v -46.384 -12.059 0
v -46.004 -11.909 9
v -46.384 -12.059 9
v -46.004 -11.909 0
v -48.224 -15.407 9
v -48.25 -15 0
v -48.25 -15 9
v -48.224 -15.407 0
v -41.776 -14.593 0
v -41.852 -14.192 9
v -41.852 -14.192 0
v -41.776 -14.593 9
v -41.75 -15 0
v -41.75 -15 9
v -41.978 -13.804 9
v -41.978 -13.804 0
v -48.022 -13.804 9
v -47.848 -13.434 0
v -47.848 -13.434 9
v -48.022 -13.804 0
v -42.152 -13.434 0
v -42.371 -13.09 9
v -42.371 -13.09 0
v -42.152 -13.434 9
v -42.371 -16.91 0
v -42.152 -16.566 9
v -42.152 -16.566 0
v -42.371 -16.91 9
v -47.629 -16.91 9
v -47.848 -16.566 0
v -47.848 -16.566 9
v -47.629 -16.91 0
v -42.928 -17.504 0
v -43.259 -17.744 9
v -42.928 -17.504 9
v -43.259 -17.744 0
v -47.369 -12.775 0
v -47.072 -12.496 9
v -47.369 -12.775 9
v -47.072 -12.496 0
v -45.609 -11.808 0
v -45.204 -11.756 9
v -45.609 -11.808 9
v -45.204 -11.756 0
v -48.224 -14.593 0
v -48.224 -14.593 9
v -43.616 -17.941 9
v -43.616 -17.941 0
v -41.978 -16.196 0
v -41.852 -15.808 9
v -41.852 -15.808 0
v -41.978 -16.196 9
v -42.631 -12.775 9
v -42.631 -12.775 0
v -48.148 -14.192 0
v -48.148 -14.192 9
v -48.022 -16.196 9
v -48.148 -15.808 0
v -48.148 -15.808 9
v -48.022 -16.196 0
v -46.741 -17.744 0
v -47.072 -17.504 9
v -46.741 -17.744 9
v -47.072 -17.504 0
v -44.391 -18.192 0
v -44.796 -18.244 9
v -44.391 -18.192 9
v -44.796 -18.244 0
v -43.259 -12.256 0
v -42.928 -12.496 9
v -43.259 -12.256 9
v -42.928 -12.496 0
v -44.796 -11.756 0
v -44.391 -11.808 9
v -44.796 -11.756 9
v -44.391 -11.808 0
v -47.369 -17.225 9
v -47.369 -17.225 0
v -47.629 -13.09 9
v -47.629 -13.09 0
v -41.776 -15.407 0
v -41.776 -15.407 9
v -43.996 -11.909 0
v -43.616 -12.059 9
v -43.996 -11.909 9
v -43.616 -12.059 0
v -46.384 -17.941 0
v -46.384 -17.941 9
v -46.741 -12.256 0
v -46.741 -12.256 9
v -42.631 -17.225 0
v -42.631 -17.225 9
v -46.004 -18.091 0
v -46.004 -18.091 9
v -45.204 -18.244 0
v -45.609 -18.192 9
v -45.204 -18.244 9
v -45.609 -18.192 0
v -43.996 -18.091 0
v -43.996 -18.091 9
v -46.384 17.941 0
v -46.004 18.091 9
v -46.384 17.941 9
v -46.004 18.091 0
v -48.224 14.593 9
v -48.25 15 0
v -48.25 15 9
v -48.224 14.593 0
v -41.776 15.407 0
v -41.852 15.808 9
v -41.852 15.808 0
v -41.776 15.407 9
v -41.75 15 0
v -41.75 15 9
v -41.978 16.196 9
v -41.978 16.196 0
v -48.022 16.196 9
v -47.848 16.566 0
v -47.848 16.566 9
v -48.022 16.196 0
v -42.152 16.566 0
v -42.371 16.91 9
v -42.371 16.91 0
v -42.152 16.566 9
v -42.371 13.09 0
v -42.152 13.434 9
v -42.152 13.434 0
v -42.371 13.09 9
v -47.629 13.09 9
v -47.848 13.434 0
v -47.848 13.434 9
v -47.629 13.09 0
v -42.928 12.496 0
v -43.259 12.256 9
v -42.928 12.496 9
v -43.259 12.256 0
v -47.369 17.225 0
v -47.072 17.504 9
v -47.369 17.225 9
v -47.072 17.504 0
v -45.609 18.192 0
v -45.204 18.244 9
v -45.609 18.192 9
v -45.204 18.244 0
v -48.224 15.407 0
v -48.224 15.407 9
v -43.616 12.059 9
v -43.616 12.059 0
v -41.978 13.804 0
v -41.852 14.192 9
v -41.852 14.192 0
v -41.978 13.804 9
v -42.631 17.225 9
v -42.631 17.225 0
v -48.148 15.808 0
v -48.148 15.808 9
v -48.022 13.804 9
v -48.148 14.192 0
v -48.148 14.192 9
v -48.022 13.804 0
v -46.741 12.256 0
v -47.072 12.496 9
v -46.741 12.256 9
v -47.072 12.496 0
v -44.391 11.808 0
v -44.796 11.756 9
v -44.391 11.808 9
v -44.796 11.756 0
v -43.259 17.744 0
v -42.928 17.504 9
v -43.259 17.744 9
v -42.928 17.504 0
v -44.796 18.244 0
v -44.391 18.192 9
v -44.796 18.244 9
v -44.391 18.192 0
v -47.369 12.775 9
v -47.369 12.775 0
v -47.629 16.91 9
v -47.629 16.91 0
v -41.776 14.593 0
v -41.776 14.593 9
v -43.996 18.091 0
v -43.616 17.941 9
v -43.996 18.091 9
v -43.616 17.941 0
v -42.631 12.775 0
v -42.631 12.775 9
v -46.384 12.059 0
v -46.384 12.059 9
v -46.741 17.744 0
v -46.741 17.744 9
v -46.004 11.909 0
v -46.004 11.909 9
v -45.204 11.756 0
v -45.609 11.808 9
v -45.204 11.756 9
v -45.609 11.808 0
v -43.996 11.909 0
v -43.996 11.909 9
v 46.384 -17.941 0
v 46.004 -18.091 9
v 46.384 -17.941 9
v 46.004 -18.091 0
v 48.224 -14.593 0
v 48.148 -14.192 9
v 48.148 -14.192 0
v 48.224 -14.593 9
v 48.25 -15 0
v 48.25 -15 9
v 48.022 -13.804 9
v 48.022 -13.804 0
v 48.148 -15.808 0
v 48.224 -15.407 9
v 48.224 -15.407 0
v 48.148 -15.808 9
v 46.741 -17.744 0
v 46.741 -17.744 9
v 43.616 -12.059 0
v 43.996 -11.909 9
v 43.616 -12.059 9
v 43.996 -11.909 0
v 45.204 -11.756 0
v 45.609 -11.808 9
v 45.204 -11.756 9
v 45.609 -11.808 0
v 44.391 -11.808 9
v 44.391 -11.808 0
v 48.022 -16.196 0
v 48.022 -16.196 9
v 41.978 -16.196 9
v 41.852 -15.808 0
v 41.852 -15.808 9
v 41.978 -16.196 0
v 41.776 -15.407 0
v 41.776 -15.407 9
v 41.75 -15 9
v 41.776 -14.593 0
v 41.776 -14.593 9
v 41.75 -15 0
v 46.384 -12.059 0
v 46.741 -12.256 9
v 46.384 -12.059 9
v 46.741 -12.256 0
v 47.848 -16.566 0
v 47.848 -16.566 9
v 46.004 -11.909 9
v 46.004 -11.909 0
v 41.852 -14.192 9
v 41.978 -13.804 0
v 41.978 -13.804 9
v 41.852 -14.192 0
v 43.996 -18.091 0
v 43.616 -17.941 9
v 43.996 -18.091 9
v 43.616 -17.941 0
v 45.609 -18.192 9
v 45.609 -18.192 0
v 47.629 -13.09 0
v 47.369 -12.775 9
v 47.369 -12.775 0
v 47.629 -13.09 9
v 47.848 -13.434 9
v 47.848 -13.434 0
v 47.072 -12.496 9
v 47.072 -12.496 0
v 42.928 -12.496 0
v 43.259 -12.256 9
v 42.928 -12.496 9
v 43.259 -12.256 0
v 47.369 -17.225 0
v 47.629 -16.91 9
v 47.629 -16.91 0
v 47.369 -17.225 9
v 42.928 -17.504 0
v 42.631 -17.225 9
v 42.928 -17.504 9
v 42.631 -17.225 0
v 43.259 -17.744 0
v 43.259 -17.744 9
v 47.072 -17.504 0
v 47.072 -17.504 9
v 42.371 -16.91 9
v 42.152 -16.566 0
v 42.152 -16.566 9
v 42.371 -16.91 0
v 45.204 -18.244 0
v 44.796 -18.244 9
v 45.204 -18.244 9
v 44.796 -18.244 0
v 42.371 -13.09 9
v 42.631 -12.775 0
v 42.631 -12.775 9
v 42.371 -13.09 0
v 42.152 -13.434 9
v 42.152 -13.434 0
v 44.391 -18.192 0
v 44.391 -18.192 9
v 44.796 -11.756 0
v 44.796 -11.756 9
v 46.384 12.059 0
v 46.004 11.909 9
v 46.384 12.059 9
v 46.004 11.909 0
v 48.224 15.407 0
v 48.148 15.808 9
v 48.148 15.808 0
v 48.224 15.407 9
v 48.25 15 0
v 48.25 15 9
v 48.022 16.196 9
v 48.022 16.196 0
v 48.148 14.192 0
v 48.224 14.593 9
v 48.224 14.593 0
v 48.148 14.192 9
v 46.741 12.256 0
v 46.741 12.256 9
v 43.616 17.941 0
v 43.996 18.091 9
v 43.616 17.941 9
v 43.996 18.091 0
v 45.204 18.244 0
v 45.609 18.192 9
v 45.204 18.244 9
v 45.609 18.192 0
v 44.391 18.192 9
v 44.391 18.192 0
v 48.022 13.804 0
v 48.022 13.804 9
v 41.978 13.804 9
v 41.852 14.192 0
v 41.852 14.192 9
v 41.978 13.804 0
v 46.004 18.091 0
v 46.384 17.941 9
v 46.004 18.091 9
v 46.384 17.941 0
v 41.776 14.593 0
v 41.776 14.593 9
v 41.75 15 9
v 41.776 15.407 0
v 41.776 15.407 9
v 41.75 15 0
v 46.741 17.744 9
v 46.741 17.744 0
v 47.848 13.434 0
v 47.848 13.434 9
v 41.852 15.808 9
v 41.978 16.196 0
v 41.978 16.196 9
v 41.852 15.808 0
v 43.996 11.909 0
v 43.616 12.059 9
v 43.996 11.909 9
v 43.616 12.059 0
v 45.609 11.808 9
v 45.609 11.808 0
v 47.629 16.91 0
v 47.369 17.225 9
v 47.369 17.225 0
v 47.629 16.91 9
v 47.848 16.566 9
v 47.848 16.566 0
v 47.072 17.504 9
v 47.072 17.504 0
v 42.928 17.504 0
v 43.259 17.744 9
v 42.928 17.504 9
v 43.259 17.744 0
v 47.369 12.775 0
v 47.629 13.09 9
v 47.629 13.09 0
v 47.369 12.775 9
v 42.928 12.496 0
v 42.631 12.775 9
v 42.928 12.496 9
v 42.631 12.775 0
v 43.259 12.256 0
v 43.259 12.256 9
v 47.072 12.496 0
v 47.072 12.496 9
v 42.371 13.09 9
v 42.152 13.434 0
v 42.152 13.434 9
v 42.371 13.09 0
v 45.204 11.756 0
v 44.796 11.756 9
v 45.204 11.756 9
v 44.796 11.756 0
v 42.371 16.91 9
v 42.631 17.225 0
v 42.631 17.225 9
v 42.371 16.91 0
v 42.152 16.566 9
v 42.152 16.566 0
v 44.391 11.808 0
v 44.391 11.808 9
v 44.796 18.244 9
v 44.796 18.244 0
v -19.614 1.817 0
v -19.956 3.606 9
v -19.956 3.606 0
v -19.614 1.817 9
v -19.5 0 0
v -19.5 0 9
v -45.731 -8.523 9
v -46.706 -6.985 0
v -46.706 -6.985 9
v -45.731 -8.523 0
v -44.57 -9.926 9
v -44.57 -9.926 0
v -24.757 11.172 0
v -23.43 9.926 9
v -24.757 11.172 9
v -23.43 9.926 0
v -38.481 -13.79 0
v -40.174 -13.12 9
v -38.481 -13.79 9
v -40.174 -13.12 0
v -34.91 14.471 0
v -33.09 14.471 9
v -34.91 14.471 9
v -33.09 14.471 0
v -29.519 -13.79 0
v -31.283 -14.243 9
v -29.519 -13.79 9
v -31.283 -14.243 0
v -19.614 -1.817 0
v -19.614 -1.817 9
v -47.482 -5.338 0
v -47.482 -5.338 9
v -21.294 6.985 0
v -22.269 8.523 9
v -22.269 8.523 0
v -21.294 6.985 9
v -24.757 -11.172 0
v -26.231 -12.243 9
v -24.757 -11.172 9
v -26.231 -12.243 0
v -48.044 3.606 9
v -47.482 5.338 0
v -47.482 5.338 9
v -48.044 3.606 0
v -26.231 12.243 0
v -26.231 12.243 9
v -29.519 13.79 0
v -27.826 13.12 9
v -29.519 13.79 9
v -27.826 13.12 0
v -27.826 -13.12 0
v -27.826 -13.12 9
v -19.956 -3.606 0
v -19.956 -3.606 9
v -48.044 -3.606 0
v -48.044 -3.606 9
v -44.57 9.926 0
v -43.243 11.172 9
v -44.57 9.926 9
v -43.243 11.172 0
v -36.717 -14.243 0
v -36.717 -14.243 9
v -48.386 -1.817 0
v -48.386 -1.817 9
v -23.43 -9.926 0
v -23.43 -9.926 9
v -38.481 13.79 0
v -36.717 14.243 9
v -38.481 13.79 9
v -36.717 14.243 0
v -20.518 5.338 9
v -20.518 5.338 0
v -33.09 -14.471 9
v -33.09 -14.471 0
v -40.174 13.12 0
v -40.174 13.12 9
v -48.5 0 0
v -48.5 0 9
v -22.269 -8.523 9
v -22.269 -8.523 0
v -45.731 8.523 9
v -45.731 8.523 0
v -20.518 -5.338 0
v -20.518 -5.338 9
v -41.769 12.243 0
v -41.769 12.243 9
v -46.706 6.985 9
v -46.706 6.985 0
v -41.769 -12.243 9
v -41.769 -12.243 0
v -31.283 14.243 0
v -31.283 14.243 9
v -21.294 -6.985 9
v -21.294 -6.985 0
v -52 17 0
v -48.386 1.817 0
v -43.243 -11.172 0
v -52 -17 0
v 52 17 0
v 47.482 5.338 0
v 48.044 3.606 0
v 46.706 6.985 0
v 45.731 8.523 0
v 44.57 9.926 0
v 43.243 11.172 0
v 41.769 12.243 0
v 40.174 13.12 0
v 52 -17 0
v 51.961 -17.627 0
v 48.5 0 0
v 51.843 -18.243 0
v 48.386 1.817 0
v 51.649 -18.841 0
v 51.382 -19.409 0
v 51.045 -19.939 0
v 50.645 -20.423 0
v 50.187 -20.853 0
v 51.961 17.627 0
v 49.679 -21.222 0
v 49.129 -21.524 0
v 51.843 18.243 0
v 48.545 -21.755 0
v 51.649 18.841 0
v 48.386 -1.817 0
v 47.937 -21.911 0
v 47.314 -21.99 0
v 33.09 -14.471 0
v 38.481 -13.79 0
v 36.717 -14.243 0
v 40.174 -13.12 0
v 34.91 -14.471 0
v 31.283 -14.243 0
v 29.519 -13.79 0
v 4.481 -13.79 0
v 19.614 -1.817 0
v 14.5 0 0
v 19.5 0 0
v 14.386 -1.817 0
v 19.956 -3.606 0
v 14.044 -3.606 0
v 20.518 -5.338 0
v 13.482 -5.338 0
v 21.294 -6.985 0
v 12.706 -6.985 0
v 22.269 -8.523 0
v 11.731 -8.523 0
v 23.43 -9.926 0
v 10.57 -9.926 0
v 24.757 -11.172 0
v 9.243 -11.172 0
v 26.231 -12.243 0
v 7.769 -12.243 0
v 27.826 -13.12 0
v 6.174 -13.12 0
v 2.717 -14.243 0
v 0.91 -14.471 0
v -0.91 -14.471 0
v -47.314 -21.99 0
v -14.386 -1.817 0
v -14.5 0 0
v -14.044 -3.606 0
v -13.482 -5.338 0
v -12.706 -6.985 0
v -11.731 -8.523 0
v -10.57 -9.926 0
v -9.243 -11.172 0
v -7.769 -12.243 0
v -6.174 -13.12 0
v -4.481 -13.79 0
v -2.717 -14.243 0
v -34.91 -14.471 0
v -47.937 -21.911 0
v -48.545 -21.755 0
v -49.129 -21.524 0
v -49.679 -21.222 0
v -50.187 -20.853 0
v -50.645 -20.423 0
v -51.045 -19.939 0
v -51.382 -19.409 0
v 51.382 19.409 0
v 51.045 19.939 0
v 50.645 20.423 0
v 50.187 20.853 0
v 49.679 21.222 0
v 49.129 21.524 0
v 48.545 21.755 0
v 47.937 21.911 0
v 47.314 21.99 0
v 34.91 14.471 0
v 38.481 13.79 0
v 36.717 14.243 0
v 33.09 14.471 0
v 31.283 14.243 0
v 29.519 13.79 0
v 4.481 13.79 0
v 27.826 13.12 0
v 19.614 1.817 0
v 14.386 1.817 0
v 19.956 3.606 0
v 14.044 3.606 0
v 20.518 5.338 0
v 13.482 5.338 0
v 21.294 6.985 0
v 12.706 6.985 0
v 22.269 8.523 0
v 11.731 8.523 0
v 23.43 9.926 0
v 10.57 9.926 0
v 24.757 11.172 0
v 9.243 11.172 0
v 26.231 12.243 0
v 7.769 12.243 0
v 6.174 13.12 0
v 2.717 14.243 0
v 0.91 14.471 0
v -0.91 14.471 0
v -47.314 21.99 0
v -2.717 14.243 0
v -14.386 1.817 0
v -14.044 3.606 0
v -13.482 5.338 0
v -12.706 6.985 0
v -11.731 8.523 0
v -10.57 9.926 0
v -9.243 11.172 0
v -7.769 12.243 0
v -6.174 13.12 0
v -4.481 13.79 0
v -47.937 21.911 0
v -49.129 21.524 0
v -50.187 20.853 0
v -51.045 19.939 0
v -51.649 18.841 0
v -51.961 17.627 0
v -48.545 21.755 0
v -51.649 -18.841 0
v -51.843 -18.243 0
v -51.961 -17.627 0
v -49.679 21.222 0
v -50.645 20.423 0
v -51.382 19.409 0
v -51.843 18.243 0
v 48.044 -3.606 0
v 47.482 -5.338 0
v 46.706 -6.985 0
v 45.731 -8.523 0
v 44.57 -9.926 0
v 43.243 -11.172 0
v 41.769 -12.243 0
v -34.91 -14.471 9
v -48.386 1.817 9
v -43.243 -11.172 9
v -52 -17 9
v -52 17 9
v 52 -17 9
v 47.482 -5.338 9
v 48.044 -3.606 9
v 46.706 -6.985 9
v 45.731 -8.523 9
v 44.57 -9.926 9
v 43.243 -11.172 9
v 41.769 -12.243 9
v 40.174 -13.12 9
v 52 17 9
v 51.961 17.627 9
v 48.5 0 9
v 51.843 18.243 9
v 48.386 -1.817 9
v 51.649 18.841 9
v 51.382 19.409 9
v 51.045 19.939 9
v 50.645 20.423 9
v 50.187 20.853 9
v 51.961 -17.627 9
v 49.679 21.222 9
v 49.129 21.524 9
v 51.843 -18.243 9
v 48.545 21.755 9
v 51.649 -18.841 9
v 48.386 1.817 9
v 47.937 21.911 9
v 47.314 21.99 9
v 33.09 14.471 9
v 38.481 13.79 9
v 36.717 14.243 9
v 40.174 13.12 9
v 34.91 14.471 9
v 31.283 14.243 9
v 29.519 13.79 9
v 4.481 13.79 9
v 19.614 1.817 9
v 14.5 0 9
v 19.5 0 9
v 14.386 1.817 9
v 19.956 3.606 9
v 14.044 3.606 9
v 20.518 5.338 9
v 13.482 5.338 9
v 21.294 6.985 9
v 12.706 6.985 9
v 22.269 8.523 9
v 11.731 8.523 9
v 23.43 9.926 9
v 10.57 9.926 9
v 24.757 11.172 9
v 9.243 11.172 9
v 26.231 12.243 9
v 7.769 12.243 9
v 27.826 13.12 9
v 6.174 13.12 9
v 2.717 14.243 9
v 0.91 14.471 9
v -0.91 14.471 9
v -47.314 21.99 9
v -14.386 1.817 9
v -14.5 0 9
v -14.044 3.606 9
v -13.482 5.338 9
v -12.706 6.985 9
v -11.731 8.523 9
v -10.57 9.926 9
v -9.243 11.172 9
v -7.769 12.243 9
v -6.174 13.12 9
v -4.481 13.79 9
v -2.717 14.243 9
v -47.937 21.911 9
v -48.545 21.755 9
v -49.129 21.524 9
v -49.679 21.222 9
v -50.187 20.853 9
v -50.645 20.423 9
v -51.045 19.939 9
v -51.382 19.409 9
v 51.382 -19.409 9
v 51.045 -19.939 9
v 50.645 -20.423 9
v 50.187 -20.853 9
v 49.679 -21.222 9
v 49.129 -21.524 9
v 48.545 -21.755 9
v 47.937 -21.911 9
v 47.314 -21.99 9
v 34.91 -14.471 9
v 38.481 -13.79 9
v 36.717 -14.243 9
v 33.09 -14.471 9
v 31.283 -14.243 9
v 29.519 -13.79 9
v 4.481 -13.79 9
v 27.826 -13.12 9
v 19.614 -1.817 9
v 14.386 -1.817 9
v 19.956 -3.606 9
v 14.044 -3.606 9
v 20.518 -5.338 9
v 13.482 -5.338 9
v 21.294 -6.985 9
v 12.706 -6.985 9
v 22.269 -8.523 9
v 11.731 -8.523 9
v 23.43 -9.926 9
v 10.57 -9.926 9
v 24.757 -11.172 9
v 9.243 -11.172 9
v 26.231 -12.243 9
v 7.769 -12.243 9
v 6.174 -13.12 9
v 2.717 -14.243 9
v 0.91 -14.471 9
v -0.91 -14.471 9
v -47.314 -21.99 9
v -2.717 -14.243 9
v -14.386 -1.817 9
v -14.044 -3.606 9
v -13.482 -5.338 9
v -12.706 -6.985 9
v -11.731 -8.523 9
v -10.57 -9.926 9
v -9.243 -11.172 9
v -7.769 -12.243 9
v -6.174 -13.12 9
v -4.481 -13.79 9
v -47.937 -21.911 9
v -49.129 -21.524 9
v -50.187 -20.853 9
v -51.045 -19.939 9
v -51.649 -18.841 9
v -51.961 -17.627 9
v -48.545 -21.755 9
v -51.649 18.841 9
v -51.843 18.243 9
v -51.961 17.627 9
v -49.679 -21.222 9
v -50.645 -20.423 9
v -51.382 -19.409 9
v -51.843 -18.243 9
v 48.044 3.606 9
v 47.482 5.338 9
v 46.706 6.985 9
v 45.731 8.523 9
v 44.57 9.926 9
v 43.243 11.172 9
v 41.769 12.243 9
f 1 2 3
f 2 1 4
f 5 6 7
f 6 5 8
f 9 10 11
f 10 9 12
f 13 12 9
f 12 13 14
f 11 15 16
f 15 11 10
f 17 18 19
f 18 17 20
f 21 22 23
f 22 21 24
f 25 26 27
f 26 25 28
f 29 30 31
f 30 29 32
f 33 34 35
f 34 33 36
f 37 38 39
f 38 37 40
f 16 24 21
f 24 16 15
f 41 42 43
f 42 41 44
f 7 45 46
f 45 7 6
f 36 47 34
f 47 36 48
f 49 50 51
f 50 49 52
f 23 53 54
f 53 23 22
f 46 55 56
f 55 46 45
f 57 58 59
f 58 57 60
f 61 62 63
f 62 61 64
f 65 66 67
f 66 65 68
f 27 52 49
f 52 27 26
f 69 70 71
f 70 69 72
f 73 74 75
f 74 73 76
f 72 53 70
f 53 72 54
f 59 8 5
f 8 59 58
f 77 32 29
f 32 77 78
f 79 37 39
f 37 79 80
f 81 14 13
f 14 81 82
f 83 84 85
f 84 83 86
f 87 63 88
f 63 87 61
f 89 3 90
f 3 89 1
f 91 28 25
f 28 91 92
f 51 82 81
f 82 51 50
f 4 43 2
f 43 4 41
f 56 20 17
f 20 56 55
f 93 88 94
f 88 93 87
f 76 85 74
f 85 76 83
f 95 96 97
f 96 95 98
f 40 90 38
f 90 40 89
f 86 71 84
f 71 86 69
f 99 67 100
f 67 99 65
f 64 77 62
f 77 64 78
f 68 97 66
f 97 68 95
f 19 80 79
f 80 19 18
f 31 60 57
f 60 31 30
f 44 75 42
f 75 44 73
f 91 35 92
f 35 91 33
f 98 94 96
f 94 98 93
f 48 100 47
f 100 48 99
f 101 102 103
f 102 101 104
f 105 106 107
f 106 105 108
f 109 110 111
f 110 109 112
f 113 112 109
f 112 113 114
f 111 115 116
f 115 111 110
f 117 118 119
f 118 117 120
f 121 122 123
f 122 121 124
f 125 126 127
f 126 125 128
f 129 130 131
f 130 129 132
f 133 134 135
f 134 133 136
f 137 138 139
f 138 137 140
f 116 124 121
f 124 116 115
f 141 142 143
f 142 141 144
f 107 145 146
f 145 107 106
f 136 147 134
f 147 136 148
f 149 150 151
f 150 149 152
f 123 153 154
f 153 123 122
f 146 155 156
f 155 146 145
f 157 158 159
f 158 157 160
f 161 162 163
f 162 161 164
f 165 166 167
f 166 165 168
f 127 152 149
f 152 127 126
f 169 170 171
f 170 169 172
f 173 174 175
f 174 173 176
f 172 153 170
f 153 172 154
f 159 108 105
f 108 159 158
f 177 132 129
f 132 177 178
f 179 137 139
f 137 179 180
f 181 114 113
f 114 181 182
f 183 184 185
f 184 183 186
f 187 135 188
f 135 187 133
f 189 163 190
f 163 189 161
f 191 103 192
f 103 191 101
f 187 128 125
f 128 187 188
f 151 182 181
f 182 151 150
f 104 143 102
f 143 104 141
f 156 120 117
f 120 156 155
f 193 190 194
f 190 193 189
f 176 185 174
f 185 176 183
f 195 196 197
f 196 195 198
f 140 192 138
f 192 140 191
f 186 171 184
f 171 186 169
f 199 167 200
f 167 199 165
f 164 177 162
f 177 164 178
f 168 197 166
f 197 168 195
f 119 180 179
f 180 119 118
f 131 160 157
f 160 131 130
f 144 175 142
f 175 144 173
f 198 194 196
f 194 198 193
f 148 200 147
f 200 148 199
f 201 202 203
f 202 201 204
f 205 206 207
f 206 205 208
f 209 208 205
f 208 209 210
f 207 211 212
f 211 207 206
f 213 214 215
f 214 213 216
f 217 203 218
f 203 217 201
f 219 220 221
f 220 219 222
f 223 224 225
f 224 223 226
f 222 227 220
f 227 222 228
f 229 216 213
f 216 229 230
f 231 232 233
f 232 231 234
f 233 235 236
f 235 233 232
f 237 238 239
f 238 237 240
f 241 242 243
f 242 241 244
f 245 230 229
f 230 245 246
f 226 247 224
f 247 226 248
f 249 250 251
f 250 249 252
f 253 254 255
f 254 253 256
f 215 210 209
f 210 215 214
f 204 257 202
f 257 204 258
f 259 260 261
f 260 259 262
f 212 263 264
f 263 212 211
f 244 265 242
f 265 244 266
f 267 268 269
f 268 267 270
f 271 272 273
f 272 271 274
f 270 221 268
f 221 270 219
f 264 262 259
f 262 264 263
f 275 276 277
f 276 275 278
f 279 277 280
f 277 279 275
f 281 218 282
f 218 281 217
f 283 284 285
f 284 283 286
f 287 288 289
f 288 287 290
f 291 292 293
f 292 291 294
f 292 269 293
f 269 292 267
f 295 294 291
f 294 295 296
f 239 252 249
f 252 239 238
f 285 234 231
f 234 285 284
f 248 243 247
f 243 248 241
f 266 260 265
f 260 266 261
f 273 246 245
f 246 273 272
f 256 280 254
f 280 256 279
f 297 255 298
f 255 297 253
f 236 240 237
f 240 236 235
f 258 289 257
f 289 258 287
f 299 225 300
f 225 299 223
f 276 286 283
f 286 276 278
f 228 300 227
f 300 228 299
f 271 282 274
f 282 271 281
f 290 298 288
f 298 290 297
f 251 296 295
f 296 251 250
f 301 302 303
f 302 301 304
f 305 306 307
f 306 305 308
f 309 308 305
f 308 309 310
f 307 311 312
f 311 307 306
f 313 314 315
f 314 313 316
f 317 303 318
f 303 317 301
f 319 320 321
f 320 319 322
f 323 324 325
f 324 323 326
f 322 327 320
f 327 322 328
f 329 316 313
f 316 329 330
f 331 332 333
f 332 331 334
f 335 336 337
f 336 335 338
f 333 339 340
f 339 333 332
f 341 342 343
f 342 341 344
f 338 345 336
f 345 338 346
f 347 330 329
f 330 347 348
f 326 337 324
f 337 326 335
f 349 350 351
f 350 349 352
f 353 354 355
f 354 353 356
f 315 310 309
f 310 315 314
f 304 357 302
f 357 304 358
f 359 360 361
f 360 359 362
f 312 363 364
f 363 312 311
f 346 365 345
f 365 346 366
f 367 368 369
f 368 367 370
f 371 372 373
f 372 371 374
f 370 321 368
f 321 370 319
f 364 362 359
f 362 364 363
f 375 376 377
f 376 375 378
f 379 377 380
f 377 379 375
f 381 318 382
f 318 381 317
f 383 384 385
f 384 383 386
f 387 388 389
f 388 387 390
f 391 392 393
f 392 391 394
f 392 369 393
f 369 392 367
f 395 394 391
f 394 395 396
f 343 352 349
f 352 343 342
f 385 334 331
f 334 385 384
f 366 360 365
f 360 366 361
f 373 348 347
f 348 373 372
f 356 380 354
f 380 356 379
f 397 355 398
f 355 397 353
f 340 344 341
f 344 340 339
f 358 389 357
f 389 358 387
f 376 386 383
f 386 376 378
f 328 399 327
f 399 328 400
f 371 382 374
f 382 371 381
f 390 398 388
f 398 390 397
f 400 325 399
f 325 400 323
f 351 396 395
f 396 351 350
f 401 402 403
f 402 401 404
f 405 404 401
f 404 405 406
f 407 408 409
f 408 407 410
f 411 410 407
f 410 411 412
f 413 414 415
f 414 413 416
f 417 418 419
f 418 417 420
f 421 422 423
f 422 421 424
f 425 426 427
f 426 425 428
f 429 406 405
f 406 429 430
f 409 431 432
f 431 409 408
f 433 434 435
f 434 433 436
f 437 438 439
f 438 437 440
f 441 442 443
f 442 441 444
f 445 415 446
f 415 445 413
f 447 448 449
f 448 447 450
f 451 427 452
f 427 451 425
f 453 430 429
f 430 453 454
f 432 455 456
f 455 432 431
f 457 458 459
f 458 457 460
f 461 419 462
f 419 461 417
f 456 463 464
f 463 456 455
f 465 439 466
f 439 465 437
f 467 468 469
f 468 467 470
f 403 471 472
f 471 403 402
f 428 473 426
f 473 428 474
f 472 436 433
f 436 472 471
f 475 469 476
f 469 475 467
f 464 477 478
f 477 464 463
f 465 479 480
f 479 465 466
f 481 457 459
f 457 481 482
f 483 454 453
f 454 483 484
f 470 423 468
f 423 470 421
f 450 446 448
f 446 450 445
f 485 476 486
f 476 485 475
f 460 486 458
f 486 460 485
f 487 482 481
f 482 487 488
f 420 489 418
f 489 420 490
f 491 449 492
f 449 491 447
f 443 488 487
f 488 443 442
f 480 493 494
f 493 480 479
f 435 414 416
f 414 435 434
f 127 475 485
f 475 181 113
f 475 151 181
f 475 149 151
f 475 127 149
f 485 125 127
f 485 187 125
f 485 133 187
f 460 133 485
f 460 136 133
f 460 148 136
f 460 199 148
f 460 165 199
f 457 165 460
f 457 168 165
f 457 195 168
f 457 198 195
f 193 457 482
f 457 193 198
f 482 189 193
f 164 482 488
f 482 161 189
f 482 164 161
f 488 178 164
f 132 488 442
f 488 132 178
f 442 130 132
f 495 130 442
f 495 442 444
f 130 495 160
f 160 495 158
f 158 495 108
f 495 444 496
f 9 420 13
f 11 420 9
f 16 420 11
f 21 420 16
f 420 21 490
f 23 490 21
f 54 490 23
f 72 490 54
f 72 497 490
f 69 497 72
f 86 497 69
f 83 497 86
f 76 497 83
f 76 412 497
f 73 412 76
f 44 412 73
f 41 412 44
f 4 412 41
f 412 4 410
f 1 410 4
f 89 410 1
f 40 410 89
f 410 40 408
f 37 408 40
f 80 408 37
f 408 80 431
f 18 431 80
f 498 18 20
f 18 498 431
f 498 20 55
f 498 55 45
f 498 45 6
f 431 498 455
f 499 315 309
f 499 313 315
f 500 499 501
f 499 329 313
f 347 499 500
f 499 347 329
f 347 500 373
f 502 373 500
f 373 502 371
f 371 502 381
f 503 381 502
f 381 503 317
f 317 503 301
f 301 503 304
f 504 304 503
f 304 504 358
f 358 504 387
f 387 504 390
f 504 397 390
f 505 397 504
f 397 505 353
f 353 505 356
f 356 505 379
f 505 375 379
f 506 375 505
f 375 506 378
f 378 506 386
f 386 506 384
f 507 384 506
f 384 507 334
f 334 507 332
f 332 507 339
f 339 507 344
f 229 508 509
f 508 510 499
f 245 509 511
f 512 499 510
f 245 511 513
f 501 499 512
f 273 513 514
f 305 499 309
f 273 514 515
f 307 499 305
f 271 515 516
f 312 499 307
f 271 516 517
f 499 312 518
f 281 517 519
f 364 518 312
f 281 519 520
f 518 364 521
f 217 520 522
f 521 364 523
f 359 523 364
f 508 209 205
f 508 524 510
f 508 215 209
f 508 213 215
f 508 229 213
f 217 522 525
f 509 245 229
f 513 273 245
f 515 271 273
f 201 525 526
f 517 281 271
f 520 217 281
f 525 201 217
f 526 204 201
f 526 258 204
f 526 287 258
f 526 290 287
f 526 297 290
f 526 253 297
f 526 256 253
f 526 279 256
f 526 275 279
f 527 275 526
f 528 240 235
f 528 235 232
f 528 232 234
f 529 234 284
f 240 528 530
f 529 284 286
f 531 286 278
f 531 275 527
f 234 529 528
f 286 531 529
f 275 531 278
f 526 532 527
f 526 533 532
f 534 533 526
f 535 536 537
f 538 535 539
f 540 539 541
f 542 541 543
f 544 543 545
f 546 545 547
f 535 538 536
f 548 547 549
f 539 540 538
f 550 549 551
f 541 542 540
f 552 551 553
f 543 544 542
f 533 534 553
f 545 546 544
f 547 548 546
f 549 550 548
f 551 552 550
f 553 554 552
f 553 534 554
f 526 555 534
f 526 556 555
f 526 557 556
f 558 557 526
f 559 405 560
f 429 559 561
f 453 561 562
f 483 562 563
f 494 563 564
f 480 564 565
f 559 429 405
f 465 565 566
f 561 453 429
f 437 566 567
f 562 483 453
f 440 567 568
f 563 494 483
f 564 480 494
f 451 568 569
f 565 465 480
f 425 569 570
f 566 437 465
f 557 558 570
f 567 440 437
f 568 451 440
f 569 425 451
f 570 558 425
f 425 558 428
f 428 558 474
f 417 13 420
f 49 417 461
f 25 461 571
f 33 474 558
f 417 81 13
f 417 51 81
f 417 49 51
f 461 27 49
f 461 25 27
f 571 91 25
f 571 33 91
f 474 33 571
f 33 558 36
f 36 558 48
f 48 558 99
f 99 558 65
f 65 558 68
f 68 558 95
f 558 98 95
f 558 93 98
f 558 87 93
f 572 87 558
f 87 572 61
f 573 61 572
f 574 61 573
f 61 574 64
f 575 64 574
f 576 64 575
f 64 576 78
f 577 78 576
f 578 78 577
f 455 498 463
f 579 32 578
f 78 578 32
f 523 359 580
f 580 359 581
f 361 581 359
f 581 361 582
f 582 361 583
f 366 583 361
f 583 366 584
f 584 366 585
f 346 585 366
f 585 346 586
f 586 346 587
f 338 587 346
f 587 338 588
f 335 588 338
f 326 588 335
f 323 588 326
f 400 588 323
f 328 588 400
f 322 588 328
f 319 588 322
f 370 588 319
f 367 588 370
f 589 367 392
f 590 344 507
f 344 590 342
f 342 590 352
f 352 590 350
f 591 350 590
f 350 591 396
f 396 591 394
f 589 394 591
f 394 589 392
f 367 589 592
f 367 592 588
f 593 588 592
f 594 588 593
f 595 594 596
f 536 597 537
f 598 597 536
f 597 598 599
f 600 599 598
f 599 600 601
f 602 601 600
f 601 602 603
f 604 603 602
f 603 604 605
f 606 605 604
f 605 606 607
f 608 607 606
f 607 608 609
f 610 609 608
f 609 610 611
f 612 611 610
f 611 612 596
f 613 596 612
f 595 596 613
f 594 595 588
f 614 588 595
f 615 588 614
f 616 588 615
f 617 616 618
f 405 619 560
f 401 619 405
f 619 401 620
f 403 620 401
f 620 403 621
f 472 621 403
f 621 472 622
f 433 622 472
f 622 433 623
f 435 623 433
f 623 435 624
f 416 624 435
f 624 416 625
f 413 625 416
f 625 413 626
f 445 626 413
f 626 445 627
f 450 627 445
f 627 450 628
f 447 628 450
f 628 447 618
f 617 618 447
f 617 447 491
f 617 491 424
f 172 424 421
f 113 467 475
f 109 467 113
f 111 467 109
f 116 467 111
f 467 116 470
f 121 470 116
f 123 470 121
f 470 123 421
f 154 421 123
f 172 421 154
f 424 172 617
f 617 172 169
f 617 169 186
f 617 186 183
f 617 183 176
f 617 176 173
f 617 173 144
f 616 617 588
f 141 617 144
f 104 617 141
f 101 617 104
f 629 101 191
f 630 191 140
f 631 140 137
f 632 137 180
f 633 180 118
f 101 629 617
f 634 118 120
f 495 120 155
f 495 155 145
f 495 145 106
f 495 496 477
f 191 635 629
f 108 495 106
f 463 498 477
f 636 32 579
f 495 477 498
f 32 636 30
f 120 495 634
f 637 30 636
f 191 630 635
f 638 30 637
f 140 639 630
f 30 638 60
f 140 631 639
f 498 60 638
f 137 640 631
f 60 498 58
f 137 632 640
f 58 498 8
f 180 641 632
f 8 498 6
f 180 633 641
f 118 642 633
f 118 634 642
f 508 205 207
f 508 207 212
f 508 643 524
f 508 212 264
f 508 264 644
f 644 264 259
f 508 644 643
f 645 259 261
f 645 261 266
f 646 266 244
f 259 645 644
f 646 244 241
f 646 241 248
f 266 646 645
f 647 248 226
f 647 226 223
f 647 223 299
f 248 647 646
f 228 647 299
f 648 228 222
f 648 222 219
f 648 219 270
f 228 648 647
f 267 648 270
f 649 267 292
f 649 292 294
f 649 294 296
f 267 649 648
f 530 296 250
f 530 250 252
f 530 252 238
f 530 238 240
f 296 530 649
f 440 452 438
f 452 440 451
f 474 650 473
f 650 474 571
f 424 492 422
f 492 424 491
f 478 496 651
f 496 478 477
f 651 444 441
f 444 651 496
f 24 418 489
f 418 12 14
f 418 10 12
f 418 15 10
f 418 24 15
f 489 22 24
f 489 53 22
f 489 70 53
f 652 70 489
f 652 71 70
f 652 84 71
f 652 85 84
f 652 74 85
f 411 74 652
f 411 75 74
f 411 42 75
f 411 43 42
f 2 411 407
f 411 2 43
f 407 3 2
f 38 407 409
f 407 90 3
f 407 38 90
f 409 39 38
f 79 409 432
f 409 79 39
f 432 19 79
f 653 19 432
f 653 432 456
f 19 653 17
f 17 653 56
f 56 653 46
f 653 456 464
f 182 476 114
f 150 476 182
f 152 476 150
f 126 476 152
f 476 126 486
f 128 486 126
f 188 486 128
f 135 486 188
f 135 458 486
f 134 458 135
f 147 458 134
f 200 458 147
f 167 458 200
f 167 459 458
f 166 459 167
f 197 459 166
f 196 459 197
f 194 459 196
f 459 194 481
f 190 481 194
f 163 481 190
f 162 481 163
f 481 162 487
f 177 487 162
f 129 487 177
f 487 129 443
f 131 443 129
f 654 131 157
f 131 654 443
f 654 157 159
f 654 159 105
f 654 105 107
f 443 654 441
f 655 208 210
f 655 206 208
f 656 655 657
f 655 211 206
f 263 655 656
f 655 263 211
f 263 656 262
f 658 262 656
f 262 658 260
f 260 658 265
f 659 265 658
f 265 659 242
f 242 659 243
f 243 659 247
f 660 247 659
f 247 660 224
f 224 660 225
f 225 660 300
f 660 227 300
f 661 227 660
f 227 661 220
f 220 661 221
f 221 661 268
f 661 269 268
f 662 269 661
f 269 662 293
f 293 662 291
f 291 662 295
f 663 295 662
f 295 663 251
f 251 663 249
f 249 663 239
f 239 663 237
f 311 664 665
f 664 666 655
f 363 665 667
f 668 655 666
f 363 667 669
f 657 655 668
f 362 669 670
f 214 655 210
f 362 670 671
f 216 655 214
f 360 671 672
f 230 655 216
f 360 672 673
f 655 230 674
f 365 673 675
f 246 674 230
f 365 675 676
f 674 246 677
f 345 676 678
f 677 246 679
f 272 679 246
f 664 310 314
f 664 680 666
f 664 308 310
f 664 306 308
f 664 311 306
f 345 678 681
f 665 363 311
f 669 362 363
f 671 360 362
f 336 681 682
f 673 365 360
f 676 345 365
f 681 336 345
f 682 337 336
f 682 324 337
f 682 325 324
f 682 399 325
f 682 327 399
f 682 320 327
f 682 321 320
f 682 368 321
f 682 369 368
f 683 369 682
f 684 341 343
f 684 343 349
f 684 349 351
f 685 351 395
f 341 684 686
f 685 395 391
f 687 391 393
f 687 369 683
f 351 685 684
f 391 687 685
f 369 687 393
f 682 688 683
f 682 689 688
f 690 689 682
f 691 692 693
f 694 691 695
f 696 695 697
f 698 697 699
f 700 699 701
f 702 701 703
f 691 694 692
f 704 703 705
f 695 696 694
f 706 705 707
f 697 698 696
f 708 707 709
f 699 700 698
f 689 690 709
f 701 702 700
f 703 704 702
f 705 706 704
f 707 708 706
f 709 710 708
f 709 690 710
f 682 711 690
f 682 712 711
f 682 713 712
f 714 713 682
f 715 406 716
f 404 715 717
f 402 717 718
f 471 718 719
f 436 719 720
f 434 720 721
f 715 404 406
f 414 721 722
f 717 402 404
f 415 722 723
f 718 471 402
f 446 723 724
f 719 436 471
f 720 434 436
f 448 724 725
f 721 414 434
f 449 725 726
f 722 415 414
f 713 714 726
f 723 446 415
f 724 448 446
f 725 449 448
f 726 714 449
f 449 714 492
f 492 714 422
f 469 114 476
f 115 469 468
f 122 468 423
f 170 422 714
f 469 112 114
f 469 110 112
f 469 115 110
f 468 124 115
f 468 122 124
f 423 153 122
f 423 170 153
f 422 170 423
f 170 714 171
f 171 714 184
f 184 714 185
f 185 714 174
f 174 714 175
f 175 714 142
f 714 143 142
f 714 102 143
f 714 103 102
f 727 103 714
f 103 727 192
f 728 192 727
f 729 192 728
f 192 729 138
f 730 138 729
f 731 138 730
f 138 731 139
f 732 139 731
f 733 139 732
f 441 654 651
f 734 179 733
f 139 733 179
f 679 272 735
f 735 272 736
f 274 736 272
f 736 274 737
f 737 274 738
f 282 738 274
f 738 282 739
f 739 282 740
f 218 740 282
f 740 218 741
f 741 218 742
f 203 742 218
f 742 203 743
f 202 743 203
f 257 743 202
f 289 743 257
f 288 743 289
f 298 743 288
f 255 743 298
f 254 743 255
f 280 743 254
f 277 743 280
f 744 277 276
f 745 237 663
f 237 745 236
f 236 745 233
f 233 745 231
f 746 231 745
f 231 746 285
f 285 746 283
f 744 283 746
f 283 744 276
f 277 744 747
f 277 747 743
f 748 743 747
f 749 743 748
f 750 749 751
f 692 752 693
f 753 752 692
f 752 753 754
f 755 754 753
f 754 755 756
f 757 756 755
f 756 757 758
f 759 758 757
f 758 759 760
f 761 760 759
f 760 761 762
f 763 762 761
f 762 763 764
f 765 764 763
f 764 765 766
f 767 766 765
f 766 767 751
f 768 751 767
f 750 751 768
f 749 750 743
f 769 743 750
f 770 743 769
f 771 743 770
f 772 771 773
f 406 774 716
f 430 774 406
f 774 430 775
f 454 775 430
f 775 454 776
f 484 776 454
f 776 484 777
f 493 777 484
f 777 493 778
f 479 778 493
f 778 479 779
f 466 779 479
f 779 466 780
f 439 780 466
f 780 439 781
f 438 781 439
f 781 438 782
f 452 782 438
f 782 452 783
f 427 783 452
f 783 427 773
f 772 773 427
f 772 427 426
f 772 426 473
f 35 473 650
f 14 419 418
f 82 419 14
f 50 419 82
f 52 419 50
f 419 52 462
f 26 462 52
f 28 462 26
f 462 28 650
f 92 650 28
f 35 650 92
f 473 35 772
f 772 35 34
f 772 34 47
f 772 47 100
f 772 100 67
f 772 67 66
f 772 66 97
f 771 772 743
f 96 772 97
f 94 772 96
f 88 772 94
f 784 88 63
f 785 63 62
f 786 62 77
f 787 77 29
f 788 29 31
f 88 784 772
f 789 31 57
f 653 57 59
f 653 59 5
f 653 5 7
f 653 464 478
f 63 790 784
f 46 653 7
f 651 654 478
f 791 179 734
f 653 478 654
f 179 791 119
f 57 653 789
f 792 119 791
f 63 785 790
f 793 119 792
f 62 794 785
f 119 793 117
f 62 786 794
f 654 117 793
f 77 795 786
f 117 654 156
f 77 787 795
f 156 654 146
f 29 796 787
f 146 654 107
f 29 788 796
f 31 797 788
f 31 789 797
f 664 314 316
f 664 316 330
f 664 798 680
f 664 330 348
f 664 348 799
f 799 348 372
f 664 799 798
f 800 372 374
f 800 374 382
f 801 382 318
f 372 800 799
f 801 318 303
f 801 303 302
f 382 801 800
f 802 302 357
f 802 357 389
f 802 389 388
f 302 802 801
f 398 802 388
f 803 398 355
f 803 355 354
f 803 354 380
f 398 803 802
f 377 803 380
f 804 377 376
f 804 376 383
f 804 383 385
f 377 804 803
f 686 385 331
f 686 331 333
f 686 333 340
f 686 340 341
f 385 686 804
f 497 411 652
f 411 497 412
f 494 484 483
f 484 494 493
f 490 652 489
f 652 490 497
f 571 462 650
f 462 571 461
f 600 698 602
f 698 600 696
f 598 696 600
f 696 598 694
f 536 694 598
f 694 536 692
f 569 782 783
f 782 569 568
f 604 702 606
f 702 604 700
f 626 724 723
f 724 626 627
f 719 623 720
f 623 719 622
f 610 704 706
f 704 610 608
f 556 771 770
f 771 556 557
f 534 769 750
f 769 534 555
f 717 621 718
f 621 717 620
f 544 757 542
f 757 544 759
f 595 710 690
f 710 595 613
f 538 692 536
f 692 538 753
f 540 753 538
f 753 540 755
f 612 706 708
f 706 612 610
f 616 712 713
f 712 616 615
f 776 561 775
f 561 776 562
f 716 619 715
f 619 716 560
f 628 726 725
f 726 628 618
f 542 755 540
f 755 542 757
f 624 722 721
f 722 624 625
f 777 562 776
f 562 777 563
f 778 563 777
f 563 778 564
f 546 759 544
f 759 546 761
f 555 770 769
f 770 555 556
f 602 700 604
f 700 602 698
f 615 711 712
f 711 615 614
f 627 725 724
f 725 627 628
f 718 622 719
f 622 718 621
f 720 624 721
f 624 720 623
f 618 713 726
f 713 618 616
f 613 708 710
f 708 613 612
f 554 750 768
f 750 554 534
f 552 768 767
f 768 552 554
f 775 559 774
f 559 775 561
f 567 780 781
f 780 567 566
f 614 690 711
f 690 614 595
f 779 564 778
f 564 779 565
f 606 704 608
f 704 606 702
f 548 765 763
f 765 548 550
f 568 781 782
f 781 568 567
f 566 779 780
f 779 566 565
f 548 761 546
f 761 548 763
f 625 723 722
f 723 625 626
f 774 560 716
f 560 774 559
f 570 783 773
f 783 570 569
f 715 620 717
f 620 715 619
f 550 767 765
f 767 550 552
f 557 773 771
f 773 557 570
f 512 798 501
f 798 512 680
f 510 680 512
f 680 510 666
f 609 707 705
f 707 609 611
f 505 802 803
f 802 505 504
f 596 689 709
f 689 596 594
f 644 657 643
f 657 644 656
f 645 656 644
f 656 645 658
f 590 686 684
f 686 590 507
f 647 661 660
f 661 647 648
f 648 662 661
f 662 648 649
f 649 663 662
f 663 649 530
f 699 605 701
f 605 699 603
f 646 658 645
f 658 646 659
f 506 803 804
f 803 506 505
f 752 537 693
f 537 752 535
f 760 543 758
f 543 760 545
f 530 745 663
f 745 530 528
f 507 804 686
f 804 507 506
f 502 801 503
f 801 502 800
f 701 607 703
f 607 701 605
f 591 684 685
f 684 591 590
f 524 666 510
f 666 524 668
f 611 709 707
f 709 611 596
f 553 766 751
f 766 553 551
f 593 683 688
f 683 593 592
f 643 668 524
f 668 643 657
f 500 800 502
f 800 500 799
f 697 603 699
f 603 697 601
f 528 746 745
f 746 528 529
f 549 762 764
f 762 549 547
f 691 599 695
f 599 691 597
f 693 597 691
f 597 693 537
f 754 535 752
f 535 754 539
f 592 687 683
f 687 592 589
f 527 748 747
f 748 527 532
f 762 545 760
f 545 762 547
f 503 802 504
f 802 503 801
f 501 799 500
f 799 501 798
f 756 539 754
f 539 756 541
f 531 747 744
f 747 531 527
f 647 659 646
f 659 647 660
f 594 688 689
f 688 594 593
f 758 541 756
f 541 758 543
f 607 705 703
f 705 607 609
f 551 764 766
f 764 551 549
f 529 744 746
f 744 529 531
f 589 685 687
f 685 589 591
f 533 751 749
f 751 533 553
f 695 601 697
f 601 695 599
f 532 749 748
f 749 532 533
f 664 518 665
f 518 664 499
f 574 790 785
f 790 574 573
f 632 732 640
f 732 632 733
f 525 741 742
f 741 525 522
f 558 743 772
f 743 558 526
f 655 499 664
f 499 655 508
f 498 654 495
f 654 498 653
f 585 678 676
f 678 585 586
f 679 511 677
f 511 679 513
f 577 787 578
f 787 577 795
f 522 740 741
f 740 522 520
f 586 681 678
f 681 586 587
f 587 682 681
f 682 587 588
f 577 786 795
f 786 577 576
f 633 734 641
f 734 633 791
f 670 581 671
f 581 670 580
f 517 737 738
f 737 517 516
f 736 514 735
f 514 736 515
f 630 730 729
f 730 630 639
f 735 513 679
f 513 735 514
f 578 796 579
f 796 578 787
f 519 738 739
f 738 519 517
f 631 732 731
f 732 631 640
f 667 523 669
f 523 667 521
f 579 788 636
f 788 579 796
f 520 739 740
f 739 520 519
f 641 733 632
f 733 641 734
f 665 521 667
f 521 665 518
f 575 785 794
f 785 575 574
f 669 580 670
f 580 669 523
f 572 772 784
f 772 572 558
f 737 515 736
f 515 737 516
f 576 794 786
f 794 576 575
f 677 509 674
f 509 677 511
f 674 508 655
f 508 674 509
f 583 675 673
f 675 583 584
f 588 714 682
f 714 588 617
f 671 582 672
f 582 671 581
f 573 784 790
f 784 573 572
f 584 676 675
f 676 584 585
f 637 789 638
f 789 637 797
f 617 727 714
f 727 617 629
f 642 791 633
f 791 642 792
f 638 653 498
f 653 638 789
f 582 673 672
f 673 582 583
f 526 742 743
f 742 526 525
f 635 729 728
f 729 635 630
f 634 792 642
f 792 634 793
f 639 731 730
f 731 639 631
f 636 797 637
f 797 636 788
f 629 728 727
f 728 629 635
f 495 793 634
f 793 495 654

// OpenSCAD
$fn = 50;

difference() {
	union() {
		hull() {
			translate(v = [-47.0, 17.0, 0]) {
				cylinder(h = 9, r = 5);
			}
			translate(v = [47.0, 17.0, 0]) {
				cylinder(h = 9, r = 5);
			}
			translate(v = [-47.0, -17.0, 0]) {
				cylinder(h = 9, r = 5);
			}
			translate(v = [47.0, -17.0, 0]) {
				cylinder(h = 9, r = 5);
			}
		}
	}
	union() {
		translate(v = [-45.0, -15.0, -100.0]) {
			cylinder(h = 200, r = 3.25);
		}
		translate(v = [-45.0, 15.0, -100.0]) {
			cylinder(h = 200, r = 3.25);
		}
		translate(v = [45.0, -15.0, -100.0]) {
			cylinder(h = 200, r = 3.25);
		}
		translate(v = [45.0, 15.0, -100.0]) {
			cylinder(h = 200, r = 3.25);
		}
		translate(v = [-45.0, -15.0, -100.0]) {
			cylinder(h = 200, r = 1.8);
		}
		translate(v = [-45.0, 15.0, -100.0]) {
			cylinder(h = 200, r = 1.8);
		}
		translate(v = [45.0, -15.0, -100.0]) {
			cylinder(h = 200, r = 1.8);
		}
		translate(v = [45.0, 15.0, -100.0]) {
			cylinder(h = 200, r = 1.8);
		}
		translate(v = [-34.0, 0, 0.0]) {
			cylinder(h = 9, r = 14.5);
		}
		cylinder(h = 9, r = 14.5);
		translate(v = [34.0, 0, 0.0]) {
			cylinder(h = 9, r = 14.5);
		}
	}
}
